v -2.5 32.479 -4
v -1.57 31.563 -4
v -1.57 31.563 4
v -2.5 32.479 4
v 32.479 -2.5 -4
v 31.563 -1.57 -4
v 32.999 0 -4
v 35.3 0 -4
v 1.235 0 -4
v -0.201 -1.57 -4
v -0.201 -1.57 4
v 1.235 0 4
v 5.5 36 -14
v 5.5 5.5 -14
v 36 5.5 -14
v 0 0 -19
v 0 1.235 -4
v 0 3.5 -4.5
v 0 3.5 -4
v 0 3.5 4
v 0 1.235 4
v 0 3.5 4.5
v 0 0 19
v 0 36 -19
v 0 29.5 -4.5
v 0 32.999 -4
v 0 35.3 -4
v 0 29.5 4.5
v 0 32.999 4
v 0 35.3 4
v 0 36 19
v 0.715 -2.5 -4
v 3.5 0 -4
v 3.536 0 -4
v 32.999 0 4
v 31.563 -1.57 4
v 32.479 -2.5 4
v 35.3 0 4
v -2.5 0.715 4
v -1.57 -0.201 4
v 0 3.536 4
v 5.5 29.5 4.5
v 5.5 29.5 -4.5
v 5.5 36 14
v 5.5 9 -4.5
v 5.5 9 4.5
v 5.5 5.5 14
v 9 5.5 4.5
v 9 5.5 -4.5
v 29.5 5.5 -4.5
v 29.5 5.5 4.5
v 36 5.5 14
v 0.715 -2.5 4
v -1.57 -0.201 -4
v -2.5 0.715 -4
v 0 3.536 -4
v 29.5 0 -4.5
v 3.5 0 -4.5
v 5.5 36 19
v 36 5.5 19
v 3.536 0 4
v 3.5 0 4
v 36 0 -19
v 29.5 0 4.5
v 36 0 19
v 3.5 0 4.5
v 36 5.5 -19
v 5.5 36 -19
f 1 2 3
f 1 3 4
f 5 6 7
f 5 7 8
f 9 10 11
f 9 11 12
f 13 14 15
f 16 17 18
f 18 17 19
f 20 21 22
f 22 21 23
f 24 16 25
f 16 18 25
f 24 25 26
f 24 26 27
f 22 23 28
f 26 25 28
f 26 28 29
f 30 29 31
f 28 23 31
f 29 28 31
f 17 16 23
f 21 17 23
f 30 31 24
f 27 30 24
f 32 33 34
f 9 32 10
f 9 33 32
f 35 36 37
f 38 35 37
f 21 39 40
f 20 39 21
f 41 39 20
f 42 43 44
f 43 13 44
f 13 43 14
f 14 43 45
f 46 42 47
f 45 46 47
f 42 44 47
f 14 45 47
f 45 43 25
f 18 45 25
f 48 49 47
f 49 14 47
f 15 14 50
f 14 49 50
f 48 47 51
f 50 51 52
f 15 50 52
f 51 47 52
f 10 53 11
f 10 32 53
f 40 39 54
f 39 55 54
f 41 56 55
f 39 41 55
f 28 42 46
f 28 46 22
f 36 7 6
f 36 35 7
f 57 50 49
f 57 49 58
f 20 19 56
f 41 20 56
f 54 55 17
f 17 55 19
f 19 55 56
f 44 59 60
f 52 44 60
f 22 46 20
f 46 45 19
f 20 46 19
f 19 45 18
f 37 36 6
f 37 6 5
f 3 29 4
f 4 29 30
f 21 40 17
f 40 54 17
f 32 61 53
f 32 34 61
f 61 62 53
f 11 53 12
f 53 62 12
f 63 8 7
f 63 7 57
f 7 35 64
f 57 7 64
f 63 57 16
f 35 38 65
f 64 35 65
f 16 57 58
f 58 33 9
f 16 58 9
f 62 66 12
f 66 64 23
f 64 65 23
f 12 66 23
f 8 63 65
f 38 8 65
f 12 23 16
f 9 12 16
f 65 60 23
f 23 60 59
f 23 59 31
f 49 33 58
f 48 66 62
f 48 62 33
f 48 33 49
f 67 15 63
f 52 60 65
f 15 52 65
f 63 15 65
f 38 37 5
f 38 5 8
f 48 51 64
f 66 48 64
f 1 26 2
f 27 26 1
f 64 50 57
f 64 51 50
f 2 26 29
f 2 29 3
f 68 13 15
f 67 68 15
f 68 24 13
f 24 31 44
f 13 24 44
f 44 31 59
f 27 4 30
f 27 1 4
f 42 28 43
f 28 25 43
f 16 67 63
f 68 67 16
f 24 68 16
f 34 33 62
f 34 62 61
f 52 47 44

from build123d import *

# Parameters (mm, degrees)
BOSS_EXTRUDE1_DEPTH = 19
CUT_EXTRUDE1_DEPTH  = 14
CUT_EXTRUDE2_DEPTH  = 4.5
BOSS_EXTRUDE2_DEPTH = 4


with BuildPart() as part:
    # Sketch1 → Boss-Extrude1 (new body, symmetric)
    with BuildSketch(Plane.XY):
        Polygon((0, 0), (0, 36), (5.5, 36), (36, 5.5), (36, 0), align=None)
    extrude(amount=BOSS_EXTRUDE1_DEPTH, both=True)

    # Sketch2 → Cut-Extrude1 (cut, symmetric)
    with BuildSketch(Plane.XY):
        Polygon((5.5, 36), (5.5, 5.5), (36, 5.5), align=None)
    extrude(amount=CUT_EXTRUDE1_DEPTH, both=True, mode=Mode.SUBTRACT)

    # Sketch3 → Cut-Extrude2 (cut, symmetric)
    with BuildSketch(Plane.XY):
        Polygon((0, 29.5), (5.5, 29.5), (5.5, 9), (0, 3.5), align=None)
        Polygon((9, 5.5), (29.5, 5.5), (29.5, 0), (3.5, 0), align=None)
    extrude(amount=CUT_EXTRUDE2_DEPTH, both=True, mode=Mode.SUBTRACT)

    # Sketch4 → Boss-Extrude2 (add, symmetric)
    with BuildSketch(Plane.XY):
        Polygon((0.714757963, -2.5), (-0.201070953, -1.5696698), (1.234750477, 0), (3.535533906, 0), align=None)
        Polygon((0, 3.535533906), (-2.5, 0.714757963), (-1.5696698, -0.201070953), (0, 1.234750477), align=None)
        Polygon((0, 35.3), (0, 32.999216572), (-1.5696698, 31.563395141), (-2.5, 32.479224057), align=None)
        Polygon((32.999216572, 0), (31.563395141, -1.5696698), (32.479224057, -2.5), (35.3, 0), align=None)
    extrude(amount=BOSS_EXTRUDE2_DEPTH, both=True)


solid = part.part
